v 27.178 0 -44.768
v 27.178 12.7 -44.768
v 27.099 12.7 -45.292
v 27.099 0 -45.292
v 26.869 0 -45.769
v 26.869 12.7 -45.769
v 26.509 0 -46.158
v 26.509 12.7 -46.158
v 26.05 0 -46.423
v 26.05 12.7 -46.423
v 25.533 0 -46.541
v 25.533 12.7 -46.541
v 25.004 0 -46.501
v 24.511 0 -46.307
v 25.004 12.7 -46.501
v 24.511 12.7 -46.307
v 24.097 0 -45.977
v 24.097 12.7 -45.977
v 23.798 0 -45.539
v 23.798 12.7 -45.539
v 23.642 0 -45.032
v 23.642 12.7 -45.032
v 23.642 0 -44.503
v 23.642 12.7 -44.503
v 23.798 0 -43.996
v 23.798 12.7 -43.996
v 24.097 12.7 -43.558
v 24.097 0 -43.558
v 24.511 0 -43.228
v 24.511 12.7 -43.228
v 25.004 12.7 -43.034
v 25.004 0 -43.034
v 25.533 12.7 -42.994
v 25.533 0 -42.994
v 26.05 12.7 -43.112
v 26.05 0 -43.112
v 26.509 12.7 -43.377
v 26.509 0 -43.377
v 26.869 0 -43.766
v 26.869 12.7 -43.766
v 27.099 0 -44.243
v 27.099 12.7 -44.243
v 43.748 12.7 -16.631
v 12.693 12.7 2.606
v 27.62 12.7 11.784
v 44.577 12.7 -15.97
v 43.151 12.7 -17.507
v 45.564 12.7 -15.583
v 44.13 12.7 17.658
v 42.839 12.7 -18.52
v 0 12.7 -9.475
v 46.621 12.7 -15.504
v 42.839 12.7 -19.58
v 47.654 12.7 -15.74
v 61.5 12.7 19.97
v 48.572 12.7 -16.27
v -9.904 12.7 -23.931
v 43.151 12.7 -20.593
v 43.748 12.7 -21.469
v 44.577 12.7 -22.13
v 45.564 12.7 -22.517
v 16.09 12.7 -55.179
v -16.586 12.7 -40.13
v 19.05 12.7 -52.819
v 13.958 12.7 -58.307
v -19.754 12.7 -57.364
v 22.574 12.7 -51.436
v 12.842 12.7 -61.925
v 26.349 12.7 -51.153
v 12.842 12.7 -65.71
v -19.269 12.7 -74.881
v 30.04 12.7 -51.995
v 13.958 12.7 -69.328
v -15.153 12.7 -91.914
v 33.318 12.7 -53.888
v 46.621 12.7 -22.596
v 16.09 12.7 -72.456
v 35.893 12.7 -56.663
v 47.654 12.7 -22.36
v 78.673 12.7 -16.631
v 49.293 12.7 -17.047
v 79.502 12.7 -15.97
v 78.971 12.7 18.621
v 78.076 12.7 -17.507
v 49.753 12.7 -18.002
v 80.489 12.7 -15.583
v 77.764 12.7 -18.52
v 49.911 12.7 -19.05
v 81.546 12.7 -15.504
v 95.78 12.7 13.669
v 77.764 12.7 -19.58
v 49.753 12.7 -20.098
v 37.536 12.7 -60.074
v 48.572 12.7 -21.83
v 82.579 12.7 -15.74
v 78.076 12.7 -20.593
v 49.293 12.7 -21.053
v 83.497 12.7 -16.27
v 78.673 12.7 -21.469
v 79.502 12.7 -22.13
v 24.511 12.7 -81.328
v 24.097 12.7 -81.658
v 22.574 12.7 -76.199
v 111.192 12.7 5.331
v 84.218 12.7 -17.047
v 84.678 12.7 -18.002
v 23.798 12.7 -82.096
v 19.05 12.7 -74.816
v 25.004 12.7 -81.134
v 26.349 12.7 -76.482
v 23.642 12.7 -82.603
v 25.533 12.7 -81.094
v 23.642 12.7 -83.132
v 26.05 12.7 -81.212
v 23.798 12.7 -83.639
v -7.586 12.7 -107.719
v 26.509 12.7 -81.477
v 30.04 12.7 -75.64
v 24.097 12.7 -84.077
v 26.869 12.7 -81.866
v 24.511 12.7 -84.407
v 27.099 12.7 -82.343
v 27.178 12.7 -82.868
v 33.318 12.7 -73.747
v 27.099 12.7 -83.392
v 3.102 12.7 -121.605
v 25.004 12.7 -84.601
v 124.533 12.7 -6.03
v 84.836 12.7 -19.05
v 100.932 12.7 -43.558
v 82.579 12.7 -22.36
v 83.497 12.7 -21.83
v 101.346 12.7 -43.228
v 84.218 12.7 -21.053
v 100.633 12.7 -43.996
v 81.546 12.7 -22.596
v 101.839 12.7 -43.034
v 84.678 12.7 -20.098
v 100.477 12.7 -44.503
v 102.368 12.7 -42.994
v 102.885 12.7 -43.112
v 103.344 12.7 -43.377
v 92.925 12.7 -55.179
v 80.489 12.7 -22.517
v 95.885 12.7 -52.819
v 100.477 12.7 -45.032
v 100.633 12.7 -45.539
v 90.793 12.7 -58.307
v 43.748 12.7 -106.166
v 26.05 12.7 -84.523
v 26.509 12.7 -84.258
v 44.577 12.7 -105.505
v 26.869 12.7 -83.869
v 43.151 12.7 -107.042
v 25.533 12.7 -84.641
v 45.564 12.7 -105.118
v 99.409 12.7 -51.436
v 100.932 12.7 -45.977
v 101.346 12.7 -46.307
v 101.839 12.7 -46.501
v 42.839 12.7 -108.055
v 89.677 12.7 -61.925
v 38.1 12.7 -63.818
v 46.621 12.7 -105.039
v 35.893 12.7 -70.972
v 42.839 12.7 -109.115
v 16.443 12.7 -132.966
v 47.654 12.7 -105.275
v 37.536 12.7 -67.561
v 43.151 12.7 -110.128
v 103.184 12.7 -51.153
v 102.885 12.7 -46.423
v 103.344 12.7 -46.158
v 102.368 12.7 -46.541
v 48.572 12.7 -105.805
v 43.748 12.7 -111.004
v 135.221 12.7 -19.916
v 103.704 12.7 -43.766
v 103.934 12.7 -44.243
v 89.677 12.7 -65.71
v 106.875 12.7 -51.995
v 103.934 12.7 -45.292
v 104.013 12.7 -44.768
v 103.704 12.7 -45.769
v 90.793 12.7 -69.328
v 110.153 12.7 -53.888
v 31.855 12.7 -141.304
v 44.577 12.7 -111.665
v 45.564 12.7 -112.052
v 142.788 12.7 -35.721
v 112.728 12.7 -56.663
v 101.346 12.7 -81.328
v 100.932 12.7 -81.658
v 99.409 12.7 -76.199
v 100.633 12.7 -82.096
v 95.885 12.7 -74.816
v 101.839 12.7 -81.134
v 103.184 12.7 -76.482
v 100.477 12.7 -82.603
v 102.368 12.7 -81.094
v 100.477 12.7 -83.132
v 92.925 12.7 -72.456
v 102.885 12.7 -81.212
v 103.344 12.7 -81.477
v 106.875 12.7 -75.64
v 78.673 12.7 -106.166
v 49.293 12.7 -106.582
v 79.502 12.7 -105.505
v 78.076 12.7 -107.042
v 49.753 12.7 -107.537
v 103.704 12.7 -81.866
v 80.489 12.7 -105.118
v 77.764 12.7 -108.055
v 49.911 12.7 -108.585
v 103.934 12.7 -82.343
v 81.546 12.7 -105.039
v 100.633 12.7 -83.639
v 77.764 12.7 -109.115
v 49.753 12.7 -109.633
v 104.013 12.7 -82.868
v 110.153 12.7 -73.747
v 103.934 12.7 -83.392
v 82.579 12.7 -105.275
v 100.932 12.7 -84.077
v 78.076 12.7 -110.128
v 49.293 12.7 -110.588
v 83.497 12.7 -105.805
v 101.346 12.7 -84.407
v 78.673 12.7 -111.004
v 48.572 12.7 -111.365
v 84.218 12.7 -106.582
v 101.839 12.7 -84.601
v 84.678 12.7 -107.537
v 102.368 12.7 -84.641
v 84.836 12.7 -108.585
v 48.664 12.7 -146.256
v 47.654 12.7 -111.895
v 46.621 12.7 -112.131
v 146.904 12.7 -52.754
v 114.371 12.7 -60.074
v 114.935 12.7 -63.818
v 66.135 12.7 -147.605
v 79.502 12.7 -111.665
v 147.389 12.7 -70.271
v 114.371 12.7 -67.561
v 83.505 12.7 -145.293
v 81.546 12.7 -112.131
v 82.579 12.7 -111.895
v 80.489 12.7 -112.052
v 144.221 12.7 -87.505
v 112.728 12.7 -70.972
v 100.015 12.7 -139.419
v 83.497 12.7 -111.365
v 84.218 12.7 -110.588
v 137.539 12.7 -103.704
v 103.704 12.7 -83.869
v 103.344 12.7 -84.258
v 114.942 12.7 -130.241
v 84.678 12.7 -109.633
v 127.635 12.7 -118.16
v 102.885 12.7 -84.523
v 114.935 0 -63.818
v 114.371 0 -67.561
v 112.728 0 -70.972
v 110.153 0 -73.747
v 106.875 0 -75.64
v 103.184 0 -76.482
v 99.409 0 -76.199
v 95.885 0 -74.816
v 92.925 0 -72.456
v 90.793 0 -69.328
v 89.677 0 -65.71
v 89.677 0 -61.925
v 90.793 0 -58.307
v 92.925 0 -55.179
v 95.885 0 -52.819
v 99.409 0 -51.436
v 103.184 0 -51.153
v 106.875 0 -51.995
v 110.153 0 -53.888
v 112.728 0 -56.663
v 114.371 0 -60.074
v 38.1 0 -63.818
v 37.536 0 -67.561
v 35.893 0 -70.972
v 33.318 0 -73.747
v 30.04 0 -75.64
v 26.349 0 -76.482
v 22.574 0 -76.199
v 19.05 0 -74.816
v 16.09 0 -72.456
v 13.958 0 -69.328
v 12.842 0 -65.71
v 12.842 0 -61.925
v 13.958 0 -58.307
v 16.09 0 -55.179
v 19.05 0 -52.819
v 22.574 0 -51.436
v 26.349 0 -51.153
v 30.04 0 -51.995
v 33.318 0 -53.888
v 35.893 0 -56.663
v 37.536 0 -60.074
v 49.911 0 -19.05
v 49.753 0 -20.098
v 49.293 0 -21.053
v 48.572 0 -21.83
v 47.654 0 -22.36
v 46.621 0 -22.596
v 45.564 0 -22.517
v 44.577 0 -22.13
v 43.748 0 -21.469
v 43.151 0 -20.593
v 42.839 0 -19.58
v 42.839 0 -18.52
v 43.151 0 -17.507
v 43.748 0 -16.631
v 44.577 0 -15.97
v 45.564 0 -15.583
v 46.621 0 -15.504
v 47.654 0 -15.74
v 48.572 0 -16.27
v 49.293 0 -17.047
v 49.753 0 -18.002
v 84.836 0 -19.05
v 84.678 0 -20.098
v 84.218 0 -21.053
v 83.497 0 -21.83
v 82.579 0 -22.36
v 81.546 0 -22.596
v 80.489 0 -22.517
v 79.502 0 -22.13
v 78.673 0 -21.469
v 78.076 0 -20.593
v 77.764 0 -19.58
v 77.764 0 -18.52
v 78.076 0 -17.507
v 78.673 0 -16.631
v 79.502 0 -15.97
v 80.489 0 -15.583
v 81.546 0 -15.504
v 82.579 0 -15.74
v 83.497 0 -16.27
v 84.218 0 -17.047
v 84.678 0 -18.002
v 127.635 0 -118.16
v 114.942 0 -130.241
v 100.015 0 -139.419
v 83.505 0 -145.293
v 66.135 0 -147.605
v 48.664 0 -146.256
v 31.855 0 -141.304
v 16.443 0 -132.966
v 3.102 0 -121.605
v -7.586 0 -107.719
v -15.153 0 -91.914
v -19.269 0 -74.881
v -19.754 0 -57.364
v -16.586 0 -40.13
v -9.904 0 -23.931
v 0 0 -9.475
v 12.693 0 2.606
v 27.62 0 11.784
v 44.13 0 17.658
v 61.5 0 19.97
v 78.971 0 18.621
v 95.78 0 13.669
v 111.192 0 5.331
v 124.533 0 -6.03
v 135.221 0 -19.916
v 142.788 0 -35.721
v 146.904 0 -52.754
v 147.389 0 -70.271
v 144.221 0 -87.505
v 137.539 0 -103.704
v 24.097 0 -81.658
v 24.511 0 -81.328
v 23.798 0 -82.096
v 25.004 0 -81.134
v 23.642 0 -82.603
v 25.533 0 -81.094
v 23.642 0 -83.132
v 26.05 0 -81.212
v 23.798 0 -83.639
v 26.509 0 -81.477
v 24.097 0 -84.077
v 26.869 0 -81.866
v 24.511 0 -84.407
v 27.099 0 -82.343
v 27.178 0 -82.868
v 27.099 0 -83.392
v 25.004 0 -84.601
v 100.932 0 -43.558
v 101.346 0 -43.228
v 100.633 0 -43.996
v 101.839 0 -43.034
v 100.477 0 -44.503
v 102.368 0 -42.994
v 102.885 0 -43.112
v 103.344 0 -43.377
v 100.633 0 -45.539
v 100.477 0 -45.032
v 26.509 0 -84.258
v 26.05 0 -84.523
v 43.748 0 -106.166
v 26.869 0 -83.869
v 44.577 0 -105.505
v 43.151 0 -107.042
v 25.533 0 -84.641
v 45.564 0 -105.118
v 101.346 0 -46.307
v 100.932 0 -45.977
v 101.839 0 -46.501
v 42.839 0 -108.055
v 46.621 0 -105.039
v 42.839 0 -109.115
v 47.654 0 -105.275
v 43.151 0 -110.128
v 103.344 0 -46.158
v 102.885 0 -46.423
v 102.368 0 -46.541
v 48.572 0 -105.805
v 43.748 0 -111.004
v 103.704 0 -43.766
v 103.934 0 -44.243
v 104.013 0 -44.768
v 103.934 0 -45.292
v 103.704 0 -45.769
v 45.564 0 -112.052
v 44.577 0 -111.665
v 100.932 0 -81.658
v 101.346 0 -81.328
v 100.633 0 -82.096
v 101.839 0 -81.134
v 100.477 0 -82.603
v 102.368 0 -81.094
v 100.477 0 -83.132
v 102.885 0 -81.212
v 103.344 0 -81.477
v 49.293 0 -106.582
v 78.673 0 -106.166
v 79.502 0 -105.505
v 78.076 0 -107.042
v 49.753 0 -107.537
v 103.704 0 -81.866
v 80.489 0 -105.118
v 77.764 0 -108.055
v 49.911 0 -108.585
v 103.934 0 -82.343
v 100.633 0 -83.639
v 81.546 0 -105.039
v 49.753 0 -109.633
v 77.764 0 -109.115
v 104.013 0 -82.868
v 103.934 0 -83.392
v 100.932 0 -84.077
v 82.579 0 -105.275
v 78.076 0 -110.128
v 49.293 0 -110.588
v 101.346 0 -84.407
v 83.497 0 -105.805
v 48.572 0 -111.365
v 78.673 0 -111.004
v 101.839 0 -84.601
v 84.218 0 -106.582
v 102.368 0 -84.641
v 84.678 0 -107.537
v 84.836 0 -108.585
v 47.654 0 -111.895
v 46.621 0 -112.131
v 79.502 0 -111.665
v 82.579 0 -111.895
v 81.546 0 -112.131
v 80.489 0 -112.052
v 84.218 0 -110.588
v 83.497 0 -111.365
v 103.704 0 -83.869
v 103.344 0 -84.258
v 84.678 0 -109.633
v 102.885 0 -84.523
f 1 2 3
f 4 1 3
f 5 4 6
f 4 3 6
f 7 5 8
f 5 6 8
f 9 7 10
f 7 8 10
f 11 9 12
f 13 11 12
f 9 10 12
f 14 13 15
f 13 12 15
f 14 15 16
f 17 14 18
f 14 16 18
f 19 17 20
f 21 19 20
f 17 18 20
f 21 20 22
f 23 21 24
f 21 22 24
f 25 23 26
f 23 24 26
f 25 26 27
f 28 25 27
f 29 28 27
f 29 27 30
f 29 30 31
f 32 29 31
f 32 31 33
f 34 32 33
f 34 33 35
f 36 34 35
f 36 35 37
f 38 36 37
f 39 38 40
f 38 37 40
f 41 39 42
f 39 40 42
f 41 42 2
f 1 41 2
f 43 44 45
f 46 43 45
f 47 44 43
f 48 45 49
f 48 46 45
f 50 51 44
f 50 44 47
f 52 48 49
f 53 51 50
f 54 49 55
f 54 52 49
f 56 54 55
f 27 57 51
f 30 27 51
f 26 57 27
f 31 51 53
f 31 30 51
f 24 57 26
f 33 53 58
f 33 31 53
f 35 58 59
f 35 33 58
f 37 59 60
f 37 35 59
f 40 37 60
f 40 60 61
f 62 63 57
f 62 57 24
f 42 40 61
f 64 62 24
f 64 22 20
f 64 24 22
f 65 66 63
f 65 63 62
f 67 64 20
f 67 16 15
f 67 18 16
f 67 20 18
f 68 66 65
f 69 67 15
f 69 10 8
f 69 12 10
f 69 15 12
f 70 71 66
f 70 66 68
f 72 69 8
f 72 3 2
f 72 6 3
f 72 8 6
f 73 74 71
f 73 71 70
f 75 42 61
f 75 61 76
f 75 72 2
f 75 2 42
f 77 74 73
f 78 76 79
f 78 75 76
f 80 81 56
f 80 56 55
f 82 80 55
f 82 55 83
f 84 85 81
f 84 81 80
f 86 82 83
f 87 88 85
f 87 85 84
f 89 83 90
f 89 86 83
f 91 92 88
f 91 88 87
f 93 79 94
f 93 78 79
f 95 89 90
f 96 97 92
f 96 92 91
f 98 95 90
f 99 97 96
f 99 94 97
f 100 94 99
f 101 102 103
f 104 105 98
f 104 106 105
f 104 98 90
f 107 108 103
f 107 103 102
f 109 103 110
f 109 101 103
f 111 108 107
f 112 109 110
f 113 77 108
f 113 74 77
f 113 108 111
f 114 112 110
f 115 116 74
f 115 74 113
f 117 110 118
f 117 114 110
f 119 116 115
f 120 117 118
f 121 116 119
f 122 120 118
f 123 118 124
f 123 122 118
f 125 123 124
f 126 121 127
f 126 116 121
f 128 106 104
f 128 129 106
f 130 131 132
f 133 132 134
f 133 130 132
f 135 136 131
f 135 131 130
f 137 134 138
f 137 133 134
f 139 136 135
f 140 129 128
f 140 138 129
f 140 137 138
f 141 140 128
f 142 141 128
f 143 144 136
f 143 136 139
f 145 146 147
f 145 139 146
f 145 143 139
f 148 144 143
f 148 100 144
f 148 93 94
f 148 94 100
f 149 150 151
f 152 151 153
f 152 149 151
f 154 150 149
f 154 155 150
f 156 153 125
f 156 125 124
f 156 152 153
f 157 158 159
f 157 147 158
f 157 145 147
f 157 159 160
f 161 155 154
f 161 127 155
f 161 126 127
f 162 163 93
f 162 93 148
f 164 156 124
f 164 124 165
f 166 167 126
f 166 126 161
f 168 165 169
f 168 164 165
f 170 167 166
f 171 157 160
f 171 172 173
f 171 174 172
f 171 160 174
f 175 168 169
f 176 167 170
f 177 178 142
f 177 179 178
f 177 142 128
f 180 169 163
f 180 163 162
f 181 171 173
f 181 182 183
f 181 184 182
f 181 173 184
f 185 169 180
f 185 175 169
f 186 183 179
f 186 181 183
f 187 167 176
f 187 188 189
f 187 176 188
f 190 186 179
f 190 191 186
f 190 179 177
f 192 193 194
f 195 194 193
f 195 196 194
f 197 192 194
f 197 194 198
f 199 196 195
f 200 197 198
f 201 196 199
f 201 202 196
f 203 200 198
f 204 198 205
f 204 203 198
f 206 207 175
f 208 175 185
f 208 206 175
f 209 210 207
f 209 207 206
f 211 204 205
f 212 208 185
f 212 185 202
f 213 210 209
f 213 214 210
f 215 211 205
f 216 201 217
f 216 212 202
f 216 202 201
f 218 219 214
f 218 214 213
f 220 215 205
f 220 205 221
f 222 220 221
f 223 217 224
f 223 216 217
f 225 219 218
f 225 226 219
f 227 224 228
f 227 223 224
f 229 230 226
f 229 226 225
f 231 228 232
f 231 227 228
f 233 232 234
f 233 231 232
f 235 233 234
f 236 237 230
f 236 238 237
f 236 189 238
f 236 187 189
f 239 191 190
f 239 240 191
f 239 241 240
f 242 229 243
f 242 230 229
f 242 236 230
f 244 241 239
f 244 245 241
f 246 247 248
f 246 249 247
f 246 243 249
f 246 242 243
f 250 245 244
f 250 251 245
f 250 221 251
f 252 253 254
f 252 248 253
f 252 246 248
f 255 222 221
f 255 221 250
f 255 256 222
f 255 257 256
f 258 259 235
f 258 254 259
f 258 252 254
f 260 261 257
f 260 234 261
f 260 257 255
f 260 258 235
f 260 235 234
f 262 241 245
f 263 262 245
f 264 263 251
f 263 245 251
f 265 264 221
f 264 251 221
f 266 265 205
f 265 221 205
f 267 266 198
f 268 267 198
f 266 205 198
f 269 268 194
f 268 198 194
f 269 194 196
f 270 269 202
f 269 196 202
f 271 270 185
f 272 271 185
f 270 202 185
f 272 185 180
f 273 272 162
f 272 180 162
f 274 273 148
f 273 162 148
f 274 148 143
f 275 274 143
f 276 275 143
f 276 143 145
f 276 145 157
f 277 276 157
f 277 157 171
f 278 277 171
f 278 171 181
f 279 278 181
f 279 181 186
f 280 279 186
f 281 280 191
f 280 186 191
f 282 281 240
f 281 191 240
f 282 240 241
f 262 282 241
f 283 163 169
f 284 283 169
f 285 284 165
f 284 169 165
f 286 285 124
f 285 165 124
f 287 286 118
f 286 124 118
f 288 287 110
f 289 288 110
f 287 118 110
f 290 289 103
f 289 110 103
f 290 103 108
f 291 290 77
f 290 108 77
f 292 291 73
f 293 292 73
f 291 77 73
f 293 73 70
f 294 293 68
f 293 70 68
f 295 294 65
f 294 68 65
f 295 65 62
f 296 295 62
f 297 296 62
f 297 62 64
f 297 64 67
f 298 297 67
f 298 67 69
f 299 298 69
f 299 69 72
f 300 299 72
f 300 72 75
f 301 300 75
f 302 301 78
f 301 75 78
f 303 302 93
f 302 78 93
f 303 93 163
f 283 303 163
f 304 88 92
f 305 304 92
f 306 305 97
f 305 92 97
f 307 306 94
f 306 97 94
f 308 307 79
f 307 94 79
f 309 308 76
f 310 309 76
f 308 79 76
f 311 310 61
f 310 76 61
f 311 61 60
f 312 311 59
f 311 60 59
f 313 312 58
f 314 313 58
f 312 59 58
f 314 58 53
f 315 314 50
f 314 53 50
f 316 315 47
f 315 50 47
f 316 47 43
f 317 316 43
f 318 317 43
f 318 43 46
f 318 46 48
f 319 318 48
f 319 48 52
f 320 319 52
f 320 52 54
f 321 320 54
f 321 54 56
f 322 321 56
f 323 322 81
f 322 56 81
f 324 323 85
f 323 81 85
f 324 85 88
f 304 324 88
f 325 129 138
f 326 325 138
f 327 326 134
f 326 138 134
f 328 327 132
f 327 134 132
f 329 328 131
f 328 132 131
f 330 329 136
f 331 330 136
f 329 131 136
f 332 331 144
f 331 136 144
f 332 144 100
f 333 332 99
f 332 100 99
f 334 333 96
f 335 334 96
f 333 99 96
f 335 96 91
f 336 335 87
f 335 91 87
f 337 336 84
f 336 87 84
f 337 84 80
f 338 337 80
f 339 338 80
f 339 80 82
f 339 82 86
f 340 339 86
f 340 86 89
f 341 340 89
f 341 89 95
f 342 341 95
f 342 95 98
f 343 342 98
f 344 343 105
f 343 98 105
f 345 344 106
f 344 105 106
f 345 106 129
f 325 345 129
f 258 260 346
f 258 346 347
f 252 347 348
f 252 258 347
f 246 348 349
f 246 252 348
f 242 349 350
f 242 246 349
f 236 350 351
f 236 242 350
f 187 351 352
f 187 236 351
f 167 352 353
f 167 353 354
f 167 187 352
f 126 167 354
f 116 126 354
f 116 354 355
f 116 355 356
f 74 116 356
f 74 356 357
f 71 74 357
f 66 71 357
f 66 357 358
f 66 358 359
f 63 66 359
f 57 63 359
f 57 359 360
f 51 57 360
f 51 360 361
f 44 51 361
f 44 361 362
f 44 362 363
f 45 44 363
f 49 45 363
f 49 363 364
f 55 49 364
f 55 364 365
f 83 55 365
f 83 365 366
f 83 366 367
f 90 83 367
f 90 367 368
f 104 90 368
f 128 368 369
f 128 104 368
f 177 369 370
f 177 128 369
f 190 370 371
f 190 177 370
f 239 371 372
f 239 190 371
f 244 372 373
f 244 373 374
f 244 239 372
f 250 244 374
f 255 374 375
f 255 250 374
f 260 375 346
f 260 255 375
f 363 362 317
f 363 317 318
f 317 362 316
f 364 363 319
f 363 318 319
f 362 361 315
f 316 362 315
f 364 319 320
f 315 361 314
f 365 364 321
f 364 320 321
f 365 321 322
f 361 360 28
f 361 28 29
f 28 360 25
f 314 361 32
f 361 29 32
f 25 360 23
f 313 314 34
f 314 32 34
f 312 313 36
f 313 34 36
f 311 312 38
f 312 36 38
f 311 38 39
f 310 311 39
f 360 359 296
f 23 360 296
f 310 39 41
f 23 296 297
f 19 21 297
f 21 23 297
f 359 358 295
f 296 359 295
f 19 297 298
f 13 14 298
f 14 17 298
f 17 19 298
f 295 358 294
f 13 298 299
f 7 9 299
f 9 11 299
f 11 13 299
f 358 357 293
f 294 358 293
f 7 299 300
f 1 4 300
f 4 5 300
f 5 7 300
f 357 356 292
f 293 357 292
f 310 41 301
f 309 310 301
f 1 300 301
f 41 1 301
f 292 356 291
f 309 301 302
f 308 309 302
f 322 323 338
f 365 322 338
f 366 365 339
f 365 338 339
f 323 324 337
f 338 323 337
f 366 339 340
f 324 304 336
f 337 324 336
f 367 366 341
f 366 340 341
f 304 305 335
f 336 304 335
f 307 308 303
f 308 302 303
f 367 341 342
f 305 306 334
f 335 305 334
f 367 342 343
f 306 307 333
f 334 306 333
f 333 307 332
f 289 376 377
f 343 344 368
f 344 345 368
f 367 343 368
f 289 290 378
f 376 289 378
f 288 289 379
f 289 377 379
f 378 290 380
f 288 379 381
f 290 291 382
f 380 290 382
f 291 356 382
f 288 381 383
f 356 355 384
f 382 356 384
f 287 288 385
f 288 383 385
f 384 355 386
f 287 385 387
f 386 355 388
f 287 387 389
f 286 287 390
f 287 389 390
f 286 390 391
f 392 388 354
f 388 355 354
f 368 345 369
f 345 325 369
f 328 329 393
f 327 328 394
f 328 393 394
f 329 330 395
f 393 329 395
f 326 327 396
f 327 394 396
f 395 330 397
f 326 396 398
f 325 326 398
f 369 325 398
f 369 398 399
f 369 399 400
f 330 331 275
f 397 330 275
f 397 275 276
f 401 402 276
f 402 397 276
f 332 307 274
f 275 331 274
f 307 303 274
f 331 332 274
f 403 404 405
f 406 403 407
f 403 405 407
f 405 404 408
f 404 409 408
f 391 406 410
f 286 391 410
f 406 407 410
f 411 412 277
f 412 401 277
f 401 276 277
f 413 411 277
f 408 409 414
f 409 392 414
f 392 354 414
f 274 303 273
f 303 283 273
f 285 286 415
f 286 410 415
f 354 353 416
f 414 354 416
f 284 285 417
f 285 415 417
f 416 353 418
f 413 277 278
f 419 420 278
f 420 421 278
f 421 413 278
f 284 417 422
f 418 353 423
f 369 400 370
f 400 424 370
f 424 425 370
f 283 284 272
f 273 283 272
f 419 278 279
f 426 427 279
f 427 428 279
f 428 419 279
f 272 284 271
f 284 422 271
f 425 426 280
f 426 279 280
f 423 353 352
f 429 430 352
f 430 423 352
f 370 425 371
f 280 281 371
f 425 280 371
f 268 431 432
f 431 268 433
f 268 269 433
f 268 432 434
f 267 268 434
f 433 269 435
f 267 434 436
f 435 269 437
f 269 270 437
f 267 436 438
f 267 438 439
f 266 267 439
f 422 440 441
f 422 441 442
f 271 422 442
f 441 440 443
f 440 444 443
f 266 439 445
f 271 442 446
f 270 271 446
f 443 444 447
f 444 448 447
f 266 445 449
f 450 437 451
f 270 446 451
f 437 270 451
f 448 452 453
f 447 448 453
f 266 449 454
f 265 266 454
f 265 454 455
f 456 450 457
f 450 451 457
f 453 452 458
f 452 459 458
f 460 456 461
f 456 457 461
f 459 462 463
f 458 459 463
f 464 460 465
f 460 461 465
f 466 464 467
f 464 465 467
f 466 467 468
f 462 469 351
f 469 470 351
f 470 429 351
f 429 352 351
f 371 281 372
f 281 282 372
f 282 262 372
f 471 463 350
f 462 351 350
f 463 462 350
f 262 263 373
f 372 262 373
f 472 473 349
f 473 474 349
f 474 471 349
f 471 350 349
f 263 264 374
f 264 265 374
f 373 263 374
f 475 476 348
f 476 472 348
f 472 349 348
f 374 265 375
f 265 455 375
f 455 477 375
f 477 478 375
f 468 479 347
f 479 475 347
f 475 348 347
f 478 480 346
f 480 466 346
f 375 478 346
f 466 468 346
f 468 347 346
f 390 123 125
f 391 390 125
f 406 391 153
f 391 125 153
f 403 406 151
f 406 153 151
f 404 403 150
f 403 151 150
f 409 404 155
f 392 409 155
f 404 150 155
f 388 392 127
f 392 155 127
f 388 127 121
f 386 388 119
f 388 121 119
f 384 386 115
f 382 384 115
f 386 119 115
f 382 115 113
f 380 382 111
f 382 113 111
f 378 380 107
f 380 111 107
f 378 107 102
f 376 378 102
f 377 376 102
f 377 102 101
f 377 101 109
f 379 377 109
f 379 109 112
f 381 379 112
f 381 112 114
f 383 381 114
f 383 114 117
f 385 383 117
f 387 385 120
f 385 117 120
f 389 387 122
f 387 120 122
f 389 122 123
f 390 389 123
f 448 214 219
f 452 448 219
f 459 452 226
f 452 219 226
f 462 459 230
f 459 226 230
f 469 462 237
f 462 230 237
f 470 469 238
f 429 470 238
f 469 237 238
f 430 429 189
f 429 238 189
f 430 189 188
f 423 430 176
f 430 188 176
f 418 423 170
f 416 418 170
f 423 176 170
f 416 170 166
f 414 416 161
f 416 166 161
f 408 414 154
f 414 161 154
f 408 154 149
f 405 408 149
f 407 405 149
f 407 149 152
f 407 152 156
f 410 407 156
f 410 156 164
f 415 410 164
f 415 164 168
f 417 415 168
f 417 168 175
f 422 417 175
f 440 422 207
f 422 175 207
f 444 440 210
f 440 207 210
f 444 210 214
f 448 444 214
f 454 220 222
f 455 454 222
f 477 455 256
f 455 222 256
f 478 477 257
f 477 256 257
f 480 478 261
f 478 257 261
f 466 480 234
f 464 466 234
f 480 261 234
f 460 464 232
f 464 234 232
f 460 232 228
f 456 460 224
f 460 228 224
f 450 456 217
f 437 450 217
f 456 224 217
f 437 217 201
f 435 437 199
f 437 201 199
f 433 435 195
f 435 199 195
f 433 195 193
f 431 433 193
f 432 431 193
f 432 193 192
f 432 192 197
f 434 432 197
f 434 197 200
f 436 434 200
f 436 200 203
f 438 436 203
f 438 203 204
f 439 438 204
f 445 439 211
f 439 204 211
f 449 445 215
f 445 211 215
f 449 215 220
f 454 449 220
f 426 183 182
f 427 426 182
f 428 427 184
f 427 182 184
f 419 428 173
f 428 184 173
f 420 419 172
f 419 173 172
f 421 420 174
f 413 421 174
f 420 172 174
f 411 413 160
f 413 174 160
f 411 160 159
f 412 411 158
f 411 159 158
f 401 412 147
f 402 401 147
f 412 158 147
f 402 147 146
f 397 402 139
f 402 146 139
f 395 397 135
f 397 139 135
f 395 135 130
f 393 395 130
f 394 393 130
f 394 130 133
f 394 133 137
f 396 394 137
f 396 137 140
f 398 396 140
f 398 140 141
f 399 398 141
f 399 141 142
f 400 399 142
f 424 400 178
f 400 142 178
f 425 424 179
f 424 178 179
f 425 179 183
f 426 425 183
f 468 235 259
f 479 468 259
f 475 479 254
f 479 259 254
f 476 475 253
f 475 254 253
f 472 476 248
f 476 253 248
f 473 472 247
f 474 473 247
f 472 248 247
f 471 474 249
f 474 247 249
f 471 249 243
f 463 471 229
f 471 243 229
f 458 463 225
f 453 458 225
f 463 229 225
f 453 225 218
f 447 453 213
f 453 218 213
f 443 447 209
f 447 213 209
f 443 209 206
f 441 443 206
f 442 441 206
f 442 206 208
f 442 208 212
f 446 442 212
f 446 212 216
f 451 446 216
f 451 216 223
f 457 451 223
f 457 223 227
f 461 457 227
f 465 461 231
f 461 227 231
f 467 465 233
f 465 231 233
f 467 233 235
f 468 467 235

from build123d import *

# Parameters (mm, degrees)
SKETCH1_W                      = 127.635
SKETCH1_H                      = 127.635
MAIN_PLATE_DEPTH               = 12.7
SKETCH9_R                      = 83.82
BOSS_EXTRUDE1_DEPTH            = 12.7
SKETCH10_R                     = 97.039626961
SKETCH10_R_2                   = 83.82
CUT_EXTRUDE1_DEPTH             = 167.64
SKETCH2_R                      = 3.556
U_BOLT_HOLE_DEPTH              = 12.7
U_BOLT_PATTERN_COUNT           = 2
U_BOLT_PATTERN_PITCH           = 34.925
U_BOLT_PATTERN_COUNT_DIR2      = 2
U_BOLT_PATTERN_PITCH_DIR2      = 89.535
SKETCH3_R                      = 1.778
RAPTOR_BOLT_HOLE_DEPTH         = 12.7
RAPTOR_BOLT_PATTERN_COUNT      = 2
RAPTOR_BOLT_PATTERN_PITCH      = 38.1
RAPTOR_BOLT_PATTERN_COUNT_DIR2 = 2
RAPTOR_BOLT_PATTERN_PITCH_DIR2 = 76.835
SKETCH4_R                      = 12.7
CO2_CYLINDER_HOLE_DEPTH        = 12.7
CO2_PATTERN_COUNT              = 2
CO2_PATTERN_PITCH              = 76.835


with BuildPart() as part:
    # Sketch1 → Main Plate (new body)
    with BuildSketch(Plane(origin=(0, 0, 0), x_dir=(1, 0, 0), z_dir=(0, 1, 0))):
        with Locations((63.8175, 63.8175)):
            Rectangle(SKETCH1_W, SKETCH1_H)
    extrude(amount=MAIN_PLATE_DEPTH)

    # Sketch9 → Boss-Extrude1 (add)
    with BuildSketch(Plane(origin=(0, 12.7, 0), x_dir=(1, 0, 0), z_dir=(0, 1, 0))):
        with Locations((63.8175, 63.8175)):
            Circle(SKETCH9_R)
    extrude(amount=-BOSS_EXTRUDE1_DEPTH)

    # Sketch10 → Cut-Extrude1 (cut)
    with BuildSketch(Plane(origin=(0, 12.7, 0), x_dir=(1, 0, 0), z_dir=(0, 1, 0))):
        with Locations((63.8175, 63.8175)):
            Circle(SKETCH10_R)
        with Locations((63.8175, 63.8175)):
            Circle(SKETCH10_R_2, mode=Mode.SUBTRACT)
    extrude(amount=-CUT_EXTRUDE1_DEPTH, mode=Mode.SUBTRACT)

    # Sketch2 → U-Bolt Hole (cut)
    with BuildSketch(Plane(origin=(0, 12.7, 0), x_dir=(1, 0, 0), z_dir=(0, 1, 0))):
        with Locations((46.355, 108.585)):
            Circle(SKETCH2_R)
    u_bolt_hole = extrude(amount=-U_BOLT_HOLE_DEPTH, mode=Mode.SUBTRACT)

    # U-Bolt Pattern: U-Bolt Hole 2 × 2
    with Locations(*[(i * U_BOLT_PATTERN_PITCH, 0, j * U_BOLT_PATTERN_PITCH_DIR2) for i in range(U_BOLT_PATTERN_COUNT) for j in range(U_BOLT_PATTERN_COUNT_DIR2) if (i, j) != (0, 0)]):
        add(u_bolt_hole, mode=Mode.SUBTRACT)

    # Sketch3 → Raptor Bolt Hole (cut)
    with BuildSketch(Plane(origin=(0, 12.7, 0), x_dir=(1, 0, 0), z_dir=(0, 1, 0))):
        with Locations((25.4, 44.7675)):
            Circle(SKETCH3_R)
    raptor_bolt_hole = extrude(amount=-RAPTOR_BOLT_HOLE_DEPTH, mode=Mode.SUBTRACT)

    # Raptor Bolt Pattern: Raptor Bolt Hole 2 × 2
    with Locations(*[(j * RAPTOR_BOLT_PATTERN_PITCH_DIR2, 0, -i * RAPTOR_BOLT_PATTERN_PITCH) for i in range(RAPTOR_BOLT_PATTERN_COUNT) for j in range(RAPTOR_BOLT_PATTERN_COUNT_DIR2) if (i, j) != (0, 0)]):
        add(raptor_bolt_hole, mode=Mode.SUBTRACT)

    # Sketch4 → Co2 Cylinder Hole (cut)
    with BuildSketch(Plane(origin=(0, 12.7, 0), x_dir=(1, 0, 0), z_dir=(0, 1, 0))):
        with Locations((25.4, 63.8175)):
            Circle(SKETCH4_R)
    co2_cylinder_hole = extrude(amount=-CO2_CYLINDER_HOLE_DEPTH, mode=Mode.SUBTRACT)

    # Co2 Pattern: Co2 Cylinder Hole ×2
    with Locations(*[(i * CO2_PATTERN_PITCH, 0, 0) for i in range(1, CO2_PATTERN_COUNT)]):
        add(co2_cylinder_hole, mode=Mode.SUBTRACT)


solid = part.part
